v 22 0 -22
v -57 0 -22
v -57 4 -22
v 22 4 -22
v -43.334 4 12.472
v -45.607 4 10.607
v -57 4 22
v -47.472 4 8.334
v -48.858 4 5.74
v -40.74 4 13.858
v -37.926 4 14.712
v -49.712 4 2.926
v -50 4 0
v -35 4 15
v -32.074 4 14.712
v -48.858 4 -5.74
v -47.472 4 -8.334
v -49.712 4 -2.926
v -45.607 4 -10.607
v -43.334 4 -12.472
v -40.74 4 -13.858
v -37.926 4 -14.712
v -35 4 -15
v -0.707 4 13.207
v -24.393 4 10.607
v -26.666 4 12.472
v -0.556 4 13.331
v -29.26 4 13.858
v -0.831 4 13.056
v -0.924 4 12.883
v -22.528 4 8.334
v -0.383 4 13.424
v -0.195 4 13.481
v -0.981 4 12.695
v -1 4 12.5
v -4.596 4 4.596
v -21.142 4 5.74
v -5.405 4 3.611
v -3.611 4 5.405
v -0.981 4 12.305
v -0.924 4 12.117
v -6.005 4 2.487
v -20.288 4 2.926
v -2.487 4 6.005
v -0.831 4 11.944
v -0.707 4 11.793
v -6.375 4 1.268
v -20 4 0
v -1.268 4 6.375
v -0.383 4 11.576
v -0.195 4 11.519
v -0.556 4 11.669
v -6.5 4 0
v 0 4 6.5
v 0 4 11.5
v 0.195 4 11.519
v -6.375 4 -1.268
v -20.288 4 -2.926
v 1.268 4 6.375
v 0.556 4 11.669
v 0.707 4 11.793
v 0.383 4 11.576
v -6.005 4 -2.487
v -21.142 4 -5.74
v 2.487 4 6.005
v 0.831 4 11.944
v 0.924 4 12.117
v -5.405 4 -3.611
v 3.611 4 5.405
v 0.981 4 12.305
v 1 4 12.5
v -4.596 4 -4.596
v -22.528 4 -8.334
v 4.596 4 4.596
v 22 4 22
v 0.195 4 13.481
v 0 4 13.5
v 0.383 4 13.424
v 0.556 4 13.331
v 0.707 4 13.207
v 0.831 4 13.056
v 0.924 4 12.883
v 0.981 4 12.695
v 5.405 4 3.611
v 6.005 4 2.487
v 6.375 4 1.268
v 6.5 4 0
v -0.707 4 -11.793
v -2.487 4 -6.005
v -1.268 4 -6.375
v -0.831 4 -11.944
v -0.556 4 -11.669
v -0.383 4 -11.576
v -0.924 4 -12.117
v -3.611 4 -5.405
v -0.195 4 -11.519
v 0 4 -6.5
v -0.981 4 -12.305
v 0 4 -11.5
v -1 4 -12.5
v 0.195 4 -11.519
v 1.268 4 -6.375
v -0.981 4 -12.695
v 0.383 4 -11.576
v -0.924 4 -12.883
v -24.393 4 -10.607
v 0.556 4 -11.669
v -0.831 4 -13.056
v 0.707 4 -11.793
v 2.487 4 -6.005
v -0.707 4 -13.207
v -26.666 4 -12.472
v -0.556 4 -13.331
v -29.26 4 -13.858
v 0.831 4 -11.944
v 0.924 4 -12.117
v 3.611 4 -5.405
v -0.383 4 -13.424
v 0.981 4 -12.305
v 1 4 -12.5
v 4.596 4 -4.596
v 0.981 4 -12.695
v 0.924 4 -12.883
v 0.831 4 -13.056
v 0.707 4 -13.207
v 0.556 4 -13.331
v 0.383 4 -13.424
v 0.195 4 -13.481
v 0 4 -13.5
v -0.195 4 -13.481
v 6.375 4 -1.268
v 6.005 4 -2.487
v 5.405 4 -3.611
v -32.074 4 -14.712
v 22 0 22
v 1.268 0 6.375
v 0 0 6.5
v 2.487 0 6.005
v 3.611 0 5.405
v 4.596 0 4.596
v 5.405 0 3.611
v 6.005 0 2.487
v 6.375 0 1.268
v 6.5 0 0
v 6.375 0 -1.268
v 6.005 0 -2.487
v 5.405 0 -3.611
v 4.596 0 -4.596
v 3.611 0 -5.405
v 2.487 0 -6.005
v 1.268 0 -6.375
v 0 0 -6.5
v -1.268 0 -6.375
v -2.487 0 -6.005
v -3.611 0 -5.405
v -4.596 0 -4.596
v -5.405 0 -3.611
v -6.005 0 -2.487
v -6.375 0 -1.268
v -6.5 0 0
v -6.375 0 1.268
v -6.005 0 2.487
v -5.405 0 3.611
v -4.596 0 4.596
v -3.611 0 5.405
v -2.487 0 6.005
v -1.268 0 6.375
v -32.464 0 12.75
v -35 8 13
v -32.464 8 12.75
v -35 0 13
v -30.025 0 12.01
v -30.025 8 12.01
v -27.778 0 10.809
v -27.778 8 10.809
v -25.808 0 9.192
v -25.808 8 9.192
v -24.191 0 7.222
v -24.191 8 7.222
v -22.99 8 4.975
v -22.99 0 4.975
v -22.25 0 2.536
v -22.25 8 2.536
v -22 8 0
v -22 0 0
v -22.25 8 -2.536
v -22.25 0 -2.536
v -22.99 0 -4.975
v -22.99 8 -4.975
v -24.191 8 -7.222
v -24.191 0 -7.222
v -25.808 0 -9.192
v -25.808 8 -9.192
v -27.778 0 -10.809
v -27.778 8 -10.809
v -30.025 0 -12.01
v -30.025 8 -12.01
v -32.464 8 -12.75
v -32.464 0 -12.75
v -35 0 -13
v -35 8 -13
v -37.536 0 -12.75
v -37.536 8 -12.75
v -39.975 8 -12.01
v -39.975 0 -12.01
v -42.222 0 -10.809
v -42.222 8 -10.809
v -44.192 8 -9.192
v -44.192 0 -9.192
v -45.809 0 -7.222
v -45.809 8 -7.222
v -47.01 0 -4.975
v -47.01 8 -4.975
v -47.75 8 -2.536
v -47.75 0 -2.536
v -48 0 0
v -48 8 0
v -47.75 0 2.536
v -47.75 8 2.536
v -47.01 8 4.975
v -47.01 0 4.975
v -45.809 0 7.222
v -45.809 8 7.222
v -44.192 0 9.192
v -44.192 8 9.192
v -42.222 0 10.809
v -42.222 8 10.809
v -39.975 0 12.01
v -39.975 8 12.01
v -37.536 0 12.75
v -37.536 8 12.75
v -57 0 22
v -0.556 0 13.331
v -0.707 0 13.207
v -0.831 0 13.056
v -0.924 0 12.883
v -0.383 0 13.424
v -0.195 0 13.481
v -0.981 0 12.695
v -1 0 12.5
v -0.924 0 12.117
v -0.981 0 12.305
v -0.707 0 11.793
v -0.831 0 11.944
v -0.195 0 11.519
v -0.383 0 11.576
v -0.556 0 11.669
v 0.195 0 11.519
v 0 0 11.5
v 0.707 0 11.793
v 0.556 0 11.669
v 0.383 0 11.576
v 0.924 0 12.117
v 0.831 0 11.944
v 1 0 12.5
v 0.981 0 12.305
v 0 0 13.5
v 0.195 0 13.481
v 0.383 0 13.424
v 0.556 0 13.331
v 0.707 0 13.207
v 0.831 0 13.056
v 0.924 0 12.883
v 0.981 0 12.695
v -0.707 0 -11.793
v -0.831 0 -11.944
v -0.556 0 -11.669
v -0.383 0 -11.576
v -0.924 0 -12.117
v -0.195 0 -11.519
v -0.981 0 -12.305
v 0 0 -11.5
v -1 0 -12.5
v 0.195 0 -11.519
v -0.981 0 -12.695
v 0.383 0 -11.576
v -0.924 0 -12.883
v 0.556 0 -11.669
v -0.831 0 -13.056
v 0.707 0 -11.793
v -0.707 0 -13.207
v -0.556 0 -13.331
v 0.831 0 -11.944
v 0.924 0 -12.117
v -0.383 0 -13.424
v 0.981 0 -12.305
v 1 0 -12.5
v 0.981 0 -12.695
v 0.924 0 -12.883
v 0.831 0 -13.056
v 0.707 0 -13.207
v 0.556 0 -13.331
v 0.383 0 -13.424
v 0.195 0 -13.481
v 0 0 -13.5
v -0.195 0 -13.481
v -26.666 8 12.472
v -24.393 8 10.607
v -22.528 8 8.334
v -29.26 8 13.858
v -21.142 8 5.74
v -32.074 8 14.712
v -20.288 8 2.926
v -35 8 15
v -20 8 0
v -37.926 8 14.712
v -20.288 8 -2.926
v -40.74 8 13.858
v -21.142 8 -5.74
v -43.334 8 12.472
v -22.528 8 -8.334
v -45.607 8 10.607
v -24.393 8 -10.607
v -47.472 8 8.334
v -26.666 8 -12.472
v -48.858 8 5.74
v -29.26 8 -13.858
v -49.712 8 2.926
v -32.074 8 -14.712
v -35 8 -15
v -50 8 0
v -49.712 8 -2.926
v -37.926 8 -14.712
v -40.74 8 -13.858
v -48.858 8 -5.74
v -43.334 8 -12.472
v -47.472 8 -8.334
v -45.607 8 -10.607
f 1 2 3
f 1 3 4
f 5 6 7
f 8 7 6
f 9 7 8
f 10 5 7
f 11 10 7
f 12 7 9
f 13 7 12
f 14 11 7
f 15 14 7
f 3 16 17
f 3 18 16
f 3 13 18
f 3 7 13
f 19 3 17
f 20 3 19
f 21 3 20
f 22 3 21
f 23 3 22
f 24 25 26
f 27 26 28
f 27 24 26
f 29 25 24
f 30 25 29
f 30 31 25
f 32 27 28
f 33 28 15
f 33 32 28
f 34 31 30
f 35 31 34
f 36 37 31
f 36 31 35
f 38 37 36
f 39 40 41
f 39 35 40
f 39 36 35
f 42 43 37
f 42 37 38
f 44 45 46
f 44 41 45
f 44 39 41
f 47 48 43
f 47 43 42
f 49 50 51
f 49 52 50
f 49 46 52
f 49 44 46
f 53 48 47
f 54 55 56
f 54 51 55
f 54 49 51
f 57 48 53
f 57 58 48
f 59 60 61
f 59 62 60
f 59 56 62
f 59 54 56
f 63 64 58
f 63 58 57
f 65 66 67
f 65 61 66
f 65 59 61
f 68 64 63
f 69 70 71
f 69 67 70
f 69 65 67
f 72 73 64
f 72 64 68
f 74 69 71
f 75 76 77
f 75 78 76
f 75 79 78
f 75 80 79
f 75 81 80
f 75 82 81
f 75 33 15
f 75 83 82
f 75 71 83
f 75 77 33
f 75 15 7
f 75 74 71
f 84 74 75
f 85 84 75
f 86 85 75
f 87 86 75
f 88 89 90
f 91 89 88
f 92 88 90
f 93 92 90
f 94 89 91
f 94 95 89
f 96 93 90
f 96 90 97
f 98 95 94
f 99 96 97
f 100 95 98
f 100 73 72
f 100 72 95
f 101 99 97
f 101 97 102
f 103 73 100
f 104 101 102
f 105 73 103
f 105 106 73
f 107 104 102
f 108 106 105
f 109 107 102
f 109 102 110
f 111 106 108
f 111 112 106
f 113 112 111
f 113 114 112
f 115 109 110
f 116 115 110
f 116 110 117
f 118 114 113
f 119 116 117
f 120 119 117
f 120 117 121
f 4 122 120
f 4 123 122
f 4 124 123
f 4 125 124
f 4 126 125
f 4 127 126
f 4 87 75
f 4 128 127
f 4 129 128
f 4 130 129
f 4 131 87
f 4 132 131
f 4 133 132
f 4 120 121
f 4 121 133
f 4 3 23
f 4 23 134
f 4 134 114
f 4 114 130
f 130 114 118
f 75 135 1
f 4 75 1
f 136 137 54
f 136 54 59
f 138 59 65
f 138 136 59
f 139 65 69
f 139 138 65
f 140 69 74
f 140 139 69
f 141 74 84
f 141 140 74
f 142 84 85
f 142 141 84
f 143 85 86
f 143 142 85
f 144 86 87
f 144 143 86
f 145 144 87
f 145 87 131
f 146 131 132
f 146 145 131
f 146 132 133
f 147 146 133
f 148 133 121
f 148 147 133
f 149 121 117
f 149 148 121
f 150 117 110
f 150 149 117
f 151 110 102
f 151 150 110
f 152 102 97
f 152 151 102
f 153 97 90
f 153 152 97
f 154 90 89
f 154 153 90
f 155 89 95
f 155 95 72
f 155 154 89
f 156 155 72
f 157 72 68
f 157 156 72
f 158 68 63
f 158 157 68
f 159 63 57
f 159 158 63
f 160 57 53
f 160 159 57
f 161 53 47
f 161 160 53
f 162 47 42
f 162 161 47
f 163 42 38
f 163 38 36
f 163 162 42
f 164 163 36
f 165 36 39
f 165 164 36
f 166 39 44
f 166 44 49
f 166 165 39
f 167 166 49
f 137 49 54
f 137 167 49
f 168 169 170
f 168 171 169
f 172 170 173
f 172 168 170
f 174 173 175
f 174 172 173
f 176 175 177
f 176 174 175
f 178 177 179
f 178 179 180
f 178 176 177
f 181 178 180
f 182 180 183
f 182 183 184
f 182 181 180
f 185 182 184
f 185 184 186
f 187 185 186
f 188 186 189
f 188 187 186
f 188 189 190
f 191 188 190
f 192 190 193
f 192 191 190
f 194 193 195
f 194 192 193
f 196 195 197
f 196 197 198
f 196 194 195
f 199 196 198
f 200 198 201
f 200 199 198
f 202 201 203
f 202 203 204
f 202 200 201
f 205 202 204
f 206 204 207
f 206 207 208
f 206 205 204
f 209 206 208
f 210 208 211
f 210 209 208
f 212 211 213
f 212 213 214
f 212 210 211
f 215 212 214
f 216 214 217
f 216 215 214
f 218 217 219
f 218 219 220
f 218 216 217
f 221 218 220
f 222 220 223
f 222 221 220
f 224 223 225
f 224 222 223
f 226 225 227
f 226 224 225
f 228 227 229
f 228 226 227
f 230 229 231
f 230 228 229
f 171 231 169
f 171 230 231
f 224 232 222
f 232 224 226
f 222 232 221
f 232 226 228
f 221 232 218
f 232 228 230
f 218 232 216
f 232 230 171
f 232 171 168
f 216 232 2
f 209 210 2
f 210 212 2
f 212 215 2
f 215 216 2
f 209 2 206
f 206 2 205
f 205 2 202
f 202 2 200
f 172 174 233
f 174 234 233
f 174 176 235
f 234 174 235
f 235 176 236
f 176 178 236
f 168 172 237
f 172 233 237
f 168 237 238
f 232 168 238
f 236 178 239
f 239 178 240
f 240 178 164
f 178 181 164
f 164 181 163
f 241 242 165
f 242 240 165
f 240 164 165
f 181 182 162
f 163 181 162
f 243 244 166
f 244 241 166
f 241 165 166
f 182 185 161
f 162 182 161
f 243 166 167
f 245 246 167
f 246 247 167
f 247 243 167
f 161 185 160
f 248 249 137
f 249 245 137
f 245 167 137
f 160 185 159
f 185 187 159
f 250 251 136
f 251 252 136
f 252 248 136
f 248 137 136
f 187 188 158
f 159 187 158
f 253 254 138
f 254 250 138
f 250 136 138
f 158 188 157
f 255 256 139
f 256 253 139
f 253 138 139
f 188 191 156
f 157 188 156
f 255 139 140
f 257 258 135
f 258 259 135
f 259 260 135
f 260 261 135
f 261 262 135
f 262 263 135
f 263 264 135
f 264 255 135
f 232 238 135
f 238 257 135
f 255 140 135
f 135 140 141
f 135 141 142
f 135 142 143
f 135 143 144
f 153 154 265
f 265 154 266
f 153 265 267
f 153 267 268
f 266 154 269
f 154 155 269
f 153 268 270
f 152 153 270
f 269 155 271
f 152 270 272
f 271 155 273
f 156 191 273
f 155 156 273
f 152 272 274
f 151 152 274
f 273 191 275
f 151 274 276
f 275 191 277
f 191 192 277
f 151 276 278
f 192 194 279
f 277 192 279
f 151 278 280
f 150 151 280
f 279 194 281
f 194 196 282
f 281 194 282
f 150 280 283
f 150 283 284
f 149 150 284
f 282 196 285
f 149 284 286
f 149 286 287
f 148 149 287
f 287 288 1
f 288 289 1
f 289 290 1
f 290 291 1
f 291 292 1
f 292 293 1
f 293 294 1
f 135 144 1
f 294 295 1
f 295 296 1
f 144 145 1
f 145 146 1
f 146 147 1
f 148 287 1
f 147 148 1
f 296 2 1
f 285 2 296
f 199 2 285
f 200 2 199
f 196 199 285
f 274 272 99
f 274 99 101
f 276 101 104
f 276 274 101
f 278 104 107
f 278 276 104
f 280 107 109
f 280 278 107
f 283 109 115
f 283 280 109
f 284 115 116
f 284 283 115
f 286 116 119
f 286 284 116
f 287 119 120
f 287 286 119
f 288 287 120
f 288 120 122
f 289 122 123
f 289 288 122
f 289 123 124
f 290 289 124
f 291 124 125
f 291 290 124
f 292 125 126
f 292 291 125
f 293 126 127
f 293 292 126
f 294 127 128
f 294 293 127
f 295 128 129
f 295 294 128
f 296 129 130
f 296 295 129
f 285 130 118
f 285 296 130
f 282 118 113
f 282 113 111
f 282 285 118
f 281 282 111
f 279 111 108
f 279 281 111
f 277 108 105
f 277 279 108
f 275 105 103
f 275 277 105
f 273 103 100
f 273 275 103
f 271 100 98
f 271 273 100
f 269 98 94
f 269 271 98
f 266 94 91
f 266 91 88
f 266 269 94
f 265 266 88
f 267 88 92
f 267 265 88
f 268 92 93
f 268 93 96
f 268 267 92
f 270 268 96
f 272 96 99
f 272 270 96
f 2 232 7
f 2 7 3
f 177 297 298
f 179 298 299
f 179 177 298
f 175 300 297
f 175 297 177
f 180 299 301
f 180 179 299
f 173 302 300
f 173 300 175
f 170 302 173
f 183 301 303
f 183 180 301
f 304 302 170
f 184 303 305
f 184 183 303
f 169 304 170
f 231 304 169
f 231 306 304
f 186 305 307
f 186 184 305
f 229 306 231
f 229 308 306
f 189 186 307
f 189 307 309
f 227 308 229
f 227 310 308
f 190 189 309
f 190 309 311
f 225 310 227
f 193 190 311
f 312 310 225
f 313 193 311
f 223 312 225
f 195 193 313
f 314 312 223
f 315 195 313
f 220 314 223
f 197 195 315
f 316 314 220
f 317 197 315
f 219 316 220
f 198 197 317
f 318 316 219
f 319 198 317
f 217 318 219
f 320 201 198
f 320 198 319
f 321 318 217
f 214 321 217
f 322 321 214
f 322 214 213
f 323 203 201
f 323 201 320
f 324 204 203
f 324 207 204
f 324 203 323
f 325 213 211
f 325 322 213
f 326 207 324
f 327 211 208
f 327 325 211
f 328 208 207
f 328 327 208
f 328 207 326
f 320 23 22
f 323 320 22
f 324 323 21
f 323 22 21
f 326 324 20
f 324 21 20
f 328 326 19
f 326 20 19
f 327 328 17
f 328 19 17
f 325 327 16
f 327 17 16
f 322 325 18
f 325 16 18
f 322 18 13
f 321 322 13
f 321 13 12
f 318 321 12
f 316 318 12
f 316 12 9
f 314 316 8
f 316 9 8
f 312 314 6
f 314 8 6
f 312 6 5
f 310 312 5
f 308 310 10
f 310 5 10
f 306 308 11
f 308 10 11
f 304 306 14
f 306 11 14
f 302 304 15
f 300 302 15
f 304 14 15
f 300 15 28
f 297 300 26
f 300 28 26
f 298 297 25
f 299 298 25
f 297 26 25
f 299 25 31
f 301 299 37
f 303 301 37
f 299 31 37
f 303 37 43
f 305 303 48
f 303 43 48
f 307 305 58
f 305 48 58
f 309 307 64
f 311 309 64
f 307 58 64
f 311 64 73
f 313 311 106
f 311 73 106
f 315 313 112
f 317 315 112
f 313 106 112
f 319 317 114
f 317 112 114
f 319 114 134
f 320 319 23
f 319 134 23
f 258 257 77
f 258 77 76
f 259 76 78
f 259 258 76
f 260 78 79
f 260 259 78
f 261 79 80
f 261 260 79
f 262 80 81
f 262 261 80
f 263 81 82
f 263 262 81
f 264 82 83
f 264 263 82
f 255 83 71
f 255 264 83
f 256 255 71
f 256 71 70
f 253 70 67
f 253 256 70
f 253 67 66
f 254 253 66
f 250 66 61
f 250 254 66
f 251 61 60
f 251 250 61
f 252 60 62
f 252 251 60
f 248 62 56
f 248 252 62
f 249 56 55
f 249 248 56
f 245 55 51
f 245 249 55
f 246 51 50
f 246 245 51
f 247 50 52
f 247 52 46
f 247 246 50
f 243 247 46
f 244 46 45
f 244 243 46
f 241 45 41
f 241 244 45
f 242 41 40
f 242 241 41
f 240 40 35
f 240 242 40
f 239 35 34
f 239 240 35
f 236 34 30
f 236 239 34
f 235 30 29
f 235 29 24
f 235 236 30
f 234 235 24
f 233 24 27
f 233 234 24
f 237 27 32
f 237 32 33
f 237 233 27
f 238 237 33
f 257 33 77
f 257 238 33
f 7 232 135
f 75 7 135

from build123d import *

# Parameters (mm, degrees)
IZIM2_W                     = 79
IZIM2_H                     = 44
IZIM2_R                     = 6.5
IZIM2_R_2                   = 1
IZIM2_R_3                   = 13
Y_KSEKLIK_EKSTR_ZYON1_DEPTH = 4
IZIM3_R                     = 15
IZIM3_R_2                   = 13
Y_KSEKLIK_EKSTR_ZYON2_DEPTH = 4


with BuildPart() as part:
    # Çizim2 → Yükseklik-Ekstrüzyon1 (new body)
    with BuildSketch(Plane(origin=(0, 0, 0), x_dir=(1, 0, 0), z_dir=(0, 1, 0))):
        with Locations((-17.5, 0)):
            Rectangle(IZIM2_W, IZIM2_H)
        with Locations(Location((0, 0, 0), (0, 0, 270))):
            Circle(IZIM2_R, mode=Mode.SUBTRACT)
        with Locations(Location((0, 12.5, 0), (0, 0, 270))):
            Circle(IZIM2_R_2, mode=Mode.SUBTRACT)
        with Locations(Location((0, -12.5, 0), (0, 0, 270))):
            Circle(IZIM2_R_2, mode=Mode.SUBTRACT)
        with Locations(Location((-35, 0, 0), (0, 0, 270))):
            Circle(IZIM2_R_3, mode=Mode.SUBTRACT)
    extrude(amount=Y_KSEKLIK_EKSTR_ZYON1_DEPTH)

    # Çizim3 → Yükseklik-Ekstrüzyon2 (add)
    with BuildSketch(Plane(origin=(0, 4, 0), x_dir=(1, 0, 0), z_dir=(0, 1, 0))):
        with Locations(Location((-35, 0, 0), (0, 0, 90))):
            Circle(IZIM3_R)
        with Locations(Location((-35, 0, 0), (0, 0, 270))):
            Circle(IZIM3_R_2, mode=Mode.SUBTRACT)
    extrude(amount=Y_KSEKLIK_EKSTR_ZYON2_DEPTH)


solid = part.part
